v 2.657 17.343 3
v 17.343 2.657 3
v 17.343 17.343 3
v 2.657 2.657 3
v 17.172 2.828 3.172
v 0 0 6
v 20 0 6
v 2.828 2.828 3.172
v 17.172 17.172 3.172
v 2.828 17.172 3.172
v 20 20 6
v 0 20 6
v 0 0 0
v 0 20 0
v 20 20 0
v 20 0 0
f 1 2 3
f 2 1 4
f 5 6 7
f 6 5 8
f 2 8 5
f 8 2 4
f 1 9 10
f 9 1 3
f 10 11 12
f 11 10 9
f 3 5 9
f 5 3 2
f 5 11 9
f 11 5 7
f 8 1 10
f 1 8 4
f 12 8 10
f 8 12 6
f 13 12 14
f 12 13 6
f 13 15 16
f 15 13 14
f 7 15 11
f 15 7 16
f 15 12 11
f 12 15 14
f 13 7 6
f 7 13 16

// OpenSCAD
// file: ../OpenSCAD/HourOfCode.scad
tileHeight = 5;

module tile(x, y) {

    difference() {
        difference() {
            difference(){
                difference() {
                    translate([x, y, 0])
                        cube([20,20,tileHeight]);

                translate([x , y , tileHeight-3])
                    rotate([45,0,0])
                        cube([20, 4, 4]);
                } 
            translate([x , y + 20, tileHeight-3])
                rotate([45,0,0])
                    cube([20, 4, 4]);
            }

        translate([x , y , tileHeight-3])
            rotate([45,0,90])
               cube([20, 4, 4]);
        }
        translate([x + 20, y + 0, tileHeight-3])
            rotate([45,0,90])
               cube([20, 4, 4]);
    }

}



module cog(x, y) {
    translate([x, y, 0]) {
        cube([20, 20, 1]);
        translate([10, 10, 1]) {
            scale([0.25, 0.25, 0.25]) {
                surface(file = "../OpenSCAD/HourOfCodeCog.png", center = true, convexity = 5);
            }
        }
    }
}

module cross(x, y) {
    translate([x, y, 0]) {
        cube([20, 20, 1]);
            translate([10, 10, 15]) {
            rotate([0, 0, 0]) {
                scale([0.18, 0.18, 0.15]) {
                    surface(file = "../OpenSCAD/HourOfCodeCross.png", invert = true, center = true, convexity = 5);
                }
            }
        }
    }
}

module boxes(x, y) {
    translate([x, y, 0]) {
        cube([20, 20, 1]);
        translate([6, 1, 0])
            rotate([0, 0, 45])
                cube([7, 7, 7]);
        translate([8, 11, 0])
            rotate([0, 0, 10])
                cube([7, 7, 7]);
        translate([14, 3, 0])
            rotate([0, 0, 40])
                cube([7, 7, 7]);
        translate([8, 6, 7])
            rotate([0, 0, 0])
                cube([7, 7, 7]);
    }
}

module boardTest() {
    difference() {
        cube([50, 50, 10]);
        translate([5, 5, 5])
            cube([40, 40, 6]);
    }
    translate([5, 5, 3])
        for (tx =[0:20:30]) 
            for (ty =[0:20:30]) {
                tile(tx,ty);
            }
}

module board() {
    difference() {
        cube([170, 170, 10]);
        translate([5, 5, 5])
            cube([160, 160, 6]);
    }
    translate([5, 5, 3])
        for (tx =[0:20:150]) 
            for (ty =[0:20:150]) {
                tile(tx,ty);
            }
}

module topPiece(x, y) {
    translate([x + 20, y, 8]) {
    rotate([0, 180, 0]) {
        difference() {
            translate([0, 0, 2]) 
                cube([20, 20, 6]);
            tile(0, 0);
        }
    }
}
}

/*
for (tx =[0:22:60]) {
    topPiece(tx, 0);
}
*/



/*
translate([0, 0, 0])
    color("Blue", 0.5)
        cog(0, 0);
//translate([0, 20, 0])
//    rotate([180, 0, 0])
//        topPiece(0, 0);


translate([0, -25, 0])
    color("Red", 0.5)
        cross(0, 0);
//translate([0, -5, 0])
//    rotate([180, 0, 0])
//        topPiece(0, 0);
*/


//tile(0, 0);
//board();
//boardTest();
//topPiece(0,0);
//cog(0, 0);
//cross(0, 0);



  
// main file
include <../OpenSCAD/HourOfCode.scad>;

/*
// ------------------------------------------------------------- //
// ------------------------------------------------------------- //
//                        T O    U S E  ;                        //
// 1. Create a file and add the following line at the top;       //
include <../OpenSCAD/HourOfCode.scad>; // already done in this file
// 2. Use one of the following templates;                        
//tile(x, y);   // build a tile, which a top piece can fit on
//board();      // build an 8 x 8 board of tiles
//boardTest();  // build a 2 x 2 board of tiles
//topPiece(x,0);// build a top piece, which will fit on top of the board
//cog(x, y);    // build a cog, to fit on top of a top piece (scrap metal)
//cross(x, y);  // build a cross, to fit on top of a top piece (bandit)
//boxes(x, y)   // build a pile of boxes, to fit on top of a top piece (obstacle)
// where x and y are the coordinates used to place the model (0, 0 works well)
*/
// ------------------------------------------------------------- //
// ------------------------------------------------------------- //

topPiece(0, 0);
